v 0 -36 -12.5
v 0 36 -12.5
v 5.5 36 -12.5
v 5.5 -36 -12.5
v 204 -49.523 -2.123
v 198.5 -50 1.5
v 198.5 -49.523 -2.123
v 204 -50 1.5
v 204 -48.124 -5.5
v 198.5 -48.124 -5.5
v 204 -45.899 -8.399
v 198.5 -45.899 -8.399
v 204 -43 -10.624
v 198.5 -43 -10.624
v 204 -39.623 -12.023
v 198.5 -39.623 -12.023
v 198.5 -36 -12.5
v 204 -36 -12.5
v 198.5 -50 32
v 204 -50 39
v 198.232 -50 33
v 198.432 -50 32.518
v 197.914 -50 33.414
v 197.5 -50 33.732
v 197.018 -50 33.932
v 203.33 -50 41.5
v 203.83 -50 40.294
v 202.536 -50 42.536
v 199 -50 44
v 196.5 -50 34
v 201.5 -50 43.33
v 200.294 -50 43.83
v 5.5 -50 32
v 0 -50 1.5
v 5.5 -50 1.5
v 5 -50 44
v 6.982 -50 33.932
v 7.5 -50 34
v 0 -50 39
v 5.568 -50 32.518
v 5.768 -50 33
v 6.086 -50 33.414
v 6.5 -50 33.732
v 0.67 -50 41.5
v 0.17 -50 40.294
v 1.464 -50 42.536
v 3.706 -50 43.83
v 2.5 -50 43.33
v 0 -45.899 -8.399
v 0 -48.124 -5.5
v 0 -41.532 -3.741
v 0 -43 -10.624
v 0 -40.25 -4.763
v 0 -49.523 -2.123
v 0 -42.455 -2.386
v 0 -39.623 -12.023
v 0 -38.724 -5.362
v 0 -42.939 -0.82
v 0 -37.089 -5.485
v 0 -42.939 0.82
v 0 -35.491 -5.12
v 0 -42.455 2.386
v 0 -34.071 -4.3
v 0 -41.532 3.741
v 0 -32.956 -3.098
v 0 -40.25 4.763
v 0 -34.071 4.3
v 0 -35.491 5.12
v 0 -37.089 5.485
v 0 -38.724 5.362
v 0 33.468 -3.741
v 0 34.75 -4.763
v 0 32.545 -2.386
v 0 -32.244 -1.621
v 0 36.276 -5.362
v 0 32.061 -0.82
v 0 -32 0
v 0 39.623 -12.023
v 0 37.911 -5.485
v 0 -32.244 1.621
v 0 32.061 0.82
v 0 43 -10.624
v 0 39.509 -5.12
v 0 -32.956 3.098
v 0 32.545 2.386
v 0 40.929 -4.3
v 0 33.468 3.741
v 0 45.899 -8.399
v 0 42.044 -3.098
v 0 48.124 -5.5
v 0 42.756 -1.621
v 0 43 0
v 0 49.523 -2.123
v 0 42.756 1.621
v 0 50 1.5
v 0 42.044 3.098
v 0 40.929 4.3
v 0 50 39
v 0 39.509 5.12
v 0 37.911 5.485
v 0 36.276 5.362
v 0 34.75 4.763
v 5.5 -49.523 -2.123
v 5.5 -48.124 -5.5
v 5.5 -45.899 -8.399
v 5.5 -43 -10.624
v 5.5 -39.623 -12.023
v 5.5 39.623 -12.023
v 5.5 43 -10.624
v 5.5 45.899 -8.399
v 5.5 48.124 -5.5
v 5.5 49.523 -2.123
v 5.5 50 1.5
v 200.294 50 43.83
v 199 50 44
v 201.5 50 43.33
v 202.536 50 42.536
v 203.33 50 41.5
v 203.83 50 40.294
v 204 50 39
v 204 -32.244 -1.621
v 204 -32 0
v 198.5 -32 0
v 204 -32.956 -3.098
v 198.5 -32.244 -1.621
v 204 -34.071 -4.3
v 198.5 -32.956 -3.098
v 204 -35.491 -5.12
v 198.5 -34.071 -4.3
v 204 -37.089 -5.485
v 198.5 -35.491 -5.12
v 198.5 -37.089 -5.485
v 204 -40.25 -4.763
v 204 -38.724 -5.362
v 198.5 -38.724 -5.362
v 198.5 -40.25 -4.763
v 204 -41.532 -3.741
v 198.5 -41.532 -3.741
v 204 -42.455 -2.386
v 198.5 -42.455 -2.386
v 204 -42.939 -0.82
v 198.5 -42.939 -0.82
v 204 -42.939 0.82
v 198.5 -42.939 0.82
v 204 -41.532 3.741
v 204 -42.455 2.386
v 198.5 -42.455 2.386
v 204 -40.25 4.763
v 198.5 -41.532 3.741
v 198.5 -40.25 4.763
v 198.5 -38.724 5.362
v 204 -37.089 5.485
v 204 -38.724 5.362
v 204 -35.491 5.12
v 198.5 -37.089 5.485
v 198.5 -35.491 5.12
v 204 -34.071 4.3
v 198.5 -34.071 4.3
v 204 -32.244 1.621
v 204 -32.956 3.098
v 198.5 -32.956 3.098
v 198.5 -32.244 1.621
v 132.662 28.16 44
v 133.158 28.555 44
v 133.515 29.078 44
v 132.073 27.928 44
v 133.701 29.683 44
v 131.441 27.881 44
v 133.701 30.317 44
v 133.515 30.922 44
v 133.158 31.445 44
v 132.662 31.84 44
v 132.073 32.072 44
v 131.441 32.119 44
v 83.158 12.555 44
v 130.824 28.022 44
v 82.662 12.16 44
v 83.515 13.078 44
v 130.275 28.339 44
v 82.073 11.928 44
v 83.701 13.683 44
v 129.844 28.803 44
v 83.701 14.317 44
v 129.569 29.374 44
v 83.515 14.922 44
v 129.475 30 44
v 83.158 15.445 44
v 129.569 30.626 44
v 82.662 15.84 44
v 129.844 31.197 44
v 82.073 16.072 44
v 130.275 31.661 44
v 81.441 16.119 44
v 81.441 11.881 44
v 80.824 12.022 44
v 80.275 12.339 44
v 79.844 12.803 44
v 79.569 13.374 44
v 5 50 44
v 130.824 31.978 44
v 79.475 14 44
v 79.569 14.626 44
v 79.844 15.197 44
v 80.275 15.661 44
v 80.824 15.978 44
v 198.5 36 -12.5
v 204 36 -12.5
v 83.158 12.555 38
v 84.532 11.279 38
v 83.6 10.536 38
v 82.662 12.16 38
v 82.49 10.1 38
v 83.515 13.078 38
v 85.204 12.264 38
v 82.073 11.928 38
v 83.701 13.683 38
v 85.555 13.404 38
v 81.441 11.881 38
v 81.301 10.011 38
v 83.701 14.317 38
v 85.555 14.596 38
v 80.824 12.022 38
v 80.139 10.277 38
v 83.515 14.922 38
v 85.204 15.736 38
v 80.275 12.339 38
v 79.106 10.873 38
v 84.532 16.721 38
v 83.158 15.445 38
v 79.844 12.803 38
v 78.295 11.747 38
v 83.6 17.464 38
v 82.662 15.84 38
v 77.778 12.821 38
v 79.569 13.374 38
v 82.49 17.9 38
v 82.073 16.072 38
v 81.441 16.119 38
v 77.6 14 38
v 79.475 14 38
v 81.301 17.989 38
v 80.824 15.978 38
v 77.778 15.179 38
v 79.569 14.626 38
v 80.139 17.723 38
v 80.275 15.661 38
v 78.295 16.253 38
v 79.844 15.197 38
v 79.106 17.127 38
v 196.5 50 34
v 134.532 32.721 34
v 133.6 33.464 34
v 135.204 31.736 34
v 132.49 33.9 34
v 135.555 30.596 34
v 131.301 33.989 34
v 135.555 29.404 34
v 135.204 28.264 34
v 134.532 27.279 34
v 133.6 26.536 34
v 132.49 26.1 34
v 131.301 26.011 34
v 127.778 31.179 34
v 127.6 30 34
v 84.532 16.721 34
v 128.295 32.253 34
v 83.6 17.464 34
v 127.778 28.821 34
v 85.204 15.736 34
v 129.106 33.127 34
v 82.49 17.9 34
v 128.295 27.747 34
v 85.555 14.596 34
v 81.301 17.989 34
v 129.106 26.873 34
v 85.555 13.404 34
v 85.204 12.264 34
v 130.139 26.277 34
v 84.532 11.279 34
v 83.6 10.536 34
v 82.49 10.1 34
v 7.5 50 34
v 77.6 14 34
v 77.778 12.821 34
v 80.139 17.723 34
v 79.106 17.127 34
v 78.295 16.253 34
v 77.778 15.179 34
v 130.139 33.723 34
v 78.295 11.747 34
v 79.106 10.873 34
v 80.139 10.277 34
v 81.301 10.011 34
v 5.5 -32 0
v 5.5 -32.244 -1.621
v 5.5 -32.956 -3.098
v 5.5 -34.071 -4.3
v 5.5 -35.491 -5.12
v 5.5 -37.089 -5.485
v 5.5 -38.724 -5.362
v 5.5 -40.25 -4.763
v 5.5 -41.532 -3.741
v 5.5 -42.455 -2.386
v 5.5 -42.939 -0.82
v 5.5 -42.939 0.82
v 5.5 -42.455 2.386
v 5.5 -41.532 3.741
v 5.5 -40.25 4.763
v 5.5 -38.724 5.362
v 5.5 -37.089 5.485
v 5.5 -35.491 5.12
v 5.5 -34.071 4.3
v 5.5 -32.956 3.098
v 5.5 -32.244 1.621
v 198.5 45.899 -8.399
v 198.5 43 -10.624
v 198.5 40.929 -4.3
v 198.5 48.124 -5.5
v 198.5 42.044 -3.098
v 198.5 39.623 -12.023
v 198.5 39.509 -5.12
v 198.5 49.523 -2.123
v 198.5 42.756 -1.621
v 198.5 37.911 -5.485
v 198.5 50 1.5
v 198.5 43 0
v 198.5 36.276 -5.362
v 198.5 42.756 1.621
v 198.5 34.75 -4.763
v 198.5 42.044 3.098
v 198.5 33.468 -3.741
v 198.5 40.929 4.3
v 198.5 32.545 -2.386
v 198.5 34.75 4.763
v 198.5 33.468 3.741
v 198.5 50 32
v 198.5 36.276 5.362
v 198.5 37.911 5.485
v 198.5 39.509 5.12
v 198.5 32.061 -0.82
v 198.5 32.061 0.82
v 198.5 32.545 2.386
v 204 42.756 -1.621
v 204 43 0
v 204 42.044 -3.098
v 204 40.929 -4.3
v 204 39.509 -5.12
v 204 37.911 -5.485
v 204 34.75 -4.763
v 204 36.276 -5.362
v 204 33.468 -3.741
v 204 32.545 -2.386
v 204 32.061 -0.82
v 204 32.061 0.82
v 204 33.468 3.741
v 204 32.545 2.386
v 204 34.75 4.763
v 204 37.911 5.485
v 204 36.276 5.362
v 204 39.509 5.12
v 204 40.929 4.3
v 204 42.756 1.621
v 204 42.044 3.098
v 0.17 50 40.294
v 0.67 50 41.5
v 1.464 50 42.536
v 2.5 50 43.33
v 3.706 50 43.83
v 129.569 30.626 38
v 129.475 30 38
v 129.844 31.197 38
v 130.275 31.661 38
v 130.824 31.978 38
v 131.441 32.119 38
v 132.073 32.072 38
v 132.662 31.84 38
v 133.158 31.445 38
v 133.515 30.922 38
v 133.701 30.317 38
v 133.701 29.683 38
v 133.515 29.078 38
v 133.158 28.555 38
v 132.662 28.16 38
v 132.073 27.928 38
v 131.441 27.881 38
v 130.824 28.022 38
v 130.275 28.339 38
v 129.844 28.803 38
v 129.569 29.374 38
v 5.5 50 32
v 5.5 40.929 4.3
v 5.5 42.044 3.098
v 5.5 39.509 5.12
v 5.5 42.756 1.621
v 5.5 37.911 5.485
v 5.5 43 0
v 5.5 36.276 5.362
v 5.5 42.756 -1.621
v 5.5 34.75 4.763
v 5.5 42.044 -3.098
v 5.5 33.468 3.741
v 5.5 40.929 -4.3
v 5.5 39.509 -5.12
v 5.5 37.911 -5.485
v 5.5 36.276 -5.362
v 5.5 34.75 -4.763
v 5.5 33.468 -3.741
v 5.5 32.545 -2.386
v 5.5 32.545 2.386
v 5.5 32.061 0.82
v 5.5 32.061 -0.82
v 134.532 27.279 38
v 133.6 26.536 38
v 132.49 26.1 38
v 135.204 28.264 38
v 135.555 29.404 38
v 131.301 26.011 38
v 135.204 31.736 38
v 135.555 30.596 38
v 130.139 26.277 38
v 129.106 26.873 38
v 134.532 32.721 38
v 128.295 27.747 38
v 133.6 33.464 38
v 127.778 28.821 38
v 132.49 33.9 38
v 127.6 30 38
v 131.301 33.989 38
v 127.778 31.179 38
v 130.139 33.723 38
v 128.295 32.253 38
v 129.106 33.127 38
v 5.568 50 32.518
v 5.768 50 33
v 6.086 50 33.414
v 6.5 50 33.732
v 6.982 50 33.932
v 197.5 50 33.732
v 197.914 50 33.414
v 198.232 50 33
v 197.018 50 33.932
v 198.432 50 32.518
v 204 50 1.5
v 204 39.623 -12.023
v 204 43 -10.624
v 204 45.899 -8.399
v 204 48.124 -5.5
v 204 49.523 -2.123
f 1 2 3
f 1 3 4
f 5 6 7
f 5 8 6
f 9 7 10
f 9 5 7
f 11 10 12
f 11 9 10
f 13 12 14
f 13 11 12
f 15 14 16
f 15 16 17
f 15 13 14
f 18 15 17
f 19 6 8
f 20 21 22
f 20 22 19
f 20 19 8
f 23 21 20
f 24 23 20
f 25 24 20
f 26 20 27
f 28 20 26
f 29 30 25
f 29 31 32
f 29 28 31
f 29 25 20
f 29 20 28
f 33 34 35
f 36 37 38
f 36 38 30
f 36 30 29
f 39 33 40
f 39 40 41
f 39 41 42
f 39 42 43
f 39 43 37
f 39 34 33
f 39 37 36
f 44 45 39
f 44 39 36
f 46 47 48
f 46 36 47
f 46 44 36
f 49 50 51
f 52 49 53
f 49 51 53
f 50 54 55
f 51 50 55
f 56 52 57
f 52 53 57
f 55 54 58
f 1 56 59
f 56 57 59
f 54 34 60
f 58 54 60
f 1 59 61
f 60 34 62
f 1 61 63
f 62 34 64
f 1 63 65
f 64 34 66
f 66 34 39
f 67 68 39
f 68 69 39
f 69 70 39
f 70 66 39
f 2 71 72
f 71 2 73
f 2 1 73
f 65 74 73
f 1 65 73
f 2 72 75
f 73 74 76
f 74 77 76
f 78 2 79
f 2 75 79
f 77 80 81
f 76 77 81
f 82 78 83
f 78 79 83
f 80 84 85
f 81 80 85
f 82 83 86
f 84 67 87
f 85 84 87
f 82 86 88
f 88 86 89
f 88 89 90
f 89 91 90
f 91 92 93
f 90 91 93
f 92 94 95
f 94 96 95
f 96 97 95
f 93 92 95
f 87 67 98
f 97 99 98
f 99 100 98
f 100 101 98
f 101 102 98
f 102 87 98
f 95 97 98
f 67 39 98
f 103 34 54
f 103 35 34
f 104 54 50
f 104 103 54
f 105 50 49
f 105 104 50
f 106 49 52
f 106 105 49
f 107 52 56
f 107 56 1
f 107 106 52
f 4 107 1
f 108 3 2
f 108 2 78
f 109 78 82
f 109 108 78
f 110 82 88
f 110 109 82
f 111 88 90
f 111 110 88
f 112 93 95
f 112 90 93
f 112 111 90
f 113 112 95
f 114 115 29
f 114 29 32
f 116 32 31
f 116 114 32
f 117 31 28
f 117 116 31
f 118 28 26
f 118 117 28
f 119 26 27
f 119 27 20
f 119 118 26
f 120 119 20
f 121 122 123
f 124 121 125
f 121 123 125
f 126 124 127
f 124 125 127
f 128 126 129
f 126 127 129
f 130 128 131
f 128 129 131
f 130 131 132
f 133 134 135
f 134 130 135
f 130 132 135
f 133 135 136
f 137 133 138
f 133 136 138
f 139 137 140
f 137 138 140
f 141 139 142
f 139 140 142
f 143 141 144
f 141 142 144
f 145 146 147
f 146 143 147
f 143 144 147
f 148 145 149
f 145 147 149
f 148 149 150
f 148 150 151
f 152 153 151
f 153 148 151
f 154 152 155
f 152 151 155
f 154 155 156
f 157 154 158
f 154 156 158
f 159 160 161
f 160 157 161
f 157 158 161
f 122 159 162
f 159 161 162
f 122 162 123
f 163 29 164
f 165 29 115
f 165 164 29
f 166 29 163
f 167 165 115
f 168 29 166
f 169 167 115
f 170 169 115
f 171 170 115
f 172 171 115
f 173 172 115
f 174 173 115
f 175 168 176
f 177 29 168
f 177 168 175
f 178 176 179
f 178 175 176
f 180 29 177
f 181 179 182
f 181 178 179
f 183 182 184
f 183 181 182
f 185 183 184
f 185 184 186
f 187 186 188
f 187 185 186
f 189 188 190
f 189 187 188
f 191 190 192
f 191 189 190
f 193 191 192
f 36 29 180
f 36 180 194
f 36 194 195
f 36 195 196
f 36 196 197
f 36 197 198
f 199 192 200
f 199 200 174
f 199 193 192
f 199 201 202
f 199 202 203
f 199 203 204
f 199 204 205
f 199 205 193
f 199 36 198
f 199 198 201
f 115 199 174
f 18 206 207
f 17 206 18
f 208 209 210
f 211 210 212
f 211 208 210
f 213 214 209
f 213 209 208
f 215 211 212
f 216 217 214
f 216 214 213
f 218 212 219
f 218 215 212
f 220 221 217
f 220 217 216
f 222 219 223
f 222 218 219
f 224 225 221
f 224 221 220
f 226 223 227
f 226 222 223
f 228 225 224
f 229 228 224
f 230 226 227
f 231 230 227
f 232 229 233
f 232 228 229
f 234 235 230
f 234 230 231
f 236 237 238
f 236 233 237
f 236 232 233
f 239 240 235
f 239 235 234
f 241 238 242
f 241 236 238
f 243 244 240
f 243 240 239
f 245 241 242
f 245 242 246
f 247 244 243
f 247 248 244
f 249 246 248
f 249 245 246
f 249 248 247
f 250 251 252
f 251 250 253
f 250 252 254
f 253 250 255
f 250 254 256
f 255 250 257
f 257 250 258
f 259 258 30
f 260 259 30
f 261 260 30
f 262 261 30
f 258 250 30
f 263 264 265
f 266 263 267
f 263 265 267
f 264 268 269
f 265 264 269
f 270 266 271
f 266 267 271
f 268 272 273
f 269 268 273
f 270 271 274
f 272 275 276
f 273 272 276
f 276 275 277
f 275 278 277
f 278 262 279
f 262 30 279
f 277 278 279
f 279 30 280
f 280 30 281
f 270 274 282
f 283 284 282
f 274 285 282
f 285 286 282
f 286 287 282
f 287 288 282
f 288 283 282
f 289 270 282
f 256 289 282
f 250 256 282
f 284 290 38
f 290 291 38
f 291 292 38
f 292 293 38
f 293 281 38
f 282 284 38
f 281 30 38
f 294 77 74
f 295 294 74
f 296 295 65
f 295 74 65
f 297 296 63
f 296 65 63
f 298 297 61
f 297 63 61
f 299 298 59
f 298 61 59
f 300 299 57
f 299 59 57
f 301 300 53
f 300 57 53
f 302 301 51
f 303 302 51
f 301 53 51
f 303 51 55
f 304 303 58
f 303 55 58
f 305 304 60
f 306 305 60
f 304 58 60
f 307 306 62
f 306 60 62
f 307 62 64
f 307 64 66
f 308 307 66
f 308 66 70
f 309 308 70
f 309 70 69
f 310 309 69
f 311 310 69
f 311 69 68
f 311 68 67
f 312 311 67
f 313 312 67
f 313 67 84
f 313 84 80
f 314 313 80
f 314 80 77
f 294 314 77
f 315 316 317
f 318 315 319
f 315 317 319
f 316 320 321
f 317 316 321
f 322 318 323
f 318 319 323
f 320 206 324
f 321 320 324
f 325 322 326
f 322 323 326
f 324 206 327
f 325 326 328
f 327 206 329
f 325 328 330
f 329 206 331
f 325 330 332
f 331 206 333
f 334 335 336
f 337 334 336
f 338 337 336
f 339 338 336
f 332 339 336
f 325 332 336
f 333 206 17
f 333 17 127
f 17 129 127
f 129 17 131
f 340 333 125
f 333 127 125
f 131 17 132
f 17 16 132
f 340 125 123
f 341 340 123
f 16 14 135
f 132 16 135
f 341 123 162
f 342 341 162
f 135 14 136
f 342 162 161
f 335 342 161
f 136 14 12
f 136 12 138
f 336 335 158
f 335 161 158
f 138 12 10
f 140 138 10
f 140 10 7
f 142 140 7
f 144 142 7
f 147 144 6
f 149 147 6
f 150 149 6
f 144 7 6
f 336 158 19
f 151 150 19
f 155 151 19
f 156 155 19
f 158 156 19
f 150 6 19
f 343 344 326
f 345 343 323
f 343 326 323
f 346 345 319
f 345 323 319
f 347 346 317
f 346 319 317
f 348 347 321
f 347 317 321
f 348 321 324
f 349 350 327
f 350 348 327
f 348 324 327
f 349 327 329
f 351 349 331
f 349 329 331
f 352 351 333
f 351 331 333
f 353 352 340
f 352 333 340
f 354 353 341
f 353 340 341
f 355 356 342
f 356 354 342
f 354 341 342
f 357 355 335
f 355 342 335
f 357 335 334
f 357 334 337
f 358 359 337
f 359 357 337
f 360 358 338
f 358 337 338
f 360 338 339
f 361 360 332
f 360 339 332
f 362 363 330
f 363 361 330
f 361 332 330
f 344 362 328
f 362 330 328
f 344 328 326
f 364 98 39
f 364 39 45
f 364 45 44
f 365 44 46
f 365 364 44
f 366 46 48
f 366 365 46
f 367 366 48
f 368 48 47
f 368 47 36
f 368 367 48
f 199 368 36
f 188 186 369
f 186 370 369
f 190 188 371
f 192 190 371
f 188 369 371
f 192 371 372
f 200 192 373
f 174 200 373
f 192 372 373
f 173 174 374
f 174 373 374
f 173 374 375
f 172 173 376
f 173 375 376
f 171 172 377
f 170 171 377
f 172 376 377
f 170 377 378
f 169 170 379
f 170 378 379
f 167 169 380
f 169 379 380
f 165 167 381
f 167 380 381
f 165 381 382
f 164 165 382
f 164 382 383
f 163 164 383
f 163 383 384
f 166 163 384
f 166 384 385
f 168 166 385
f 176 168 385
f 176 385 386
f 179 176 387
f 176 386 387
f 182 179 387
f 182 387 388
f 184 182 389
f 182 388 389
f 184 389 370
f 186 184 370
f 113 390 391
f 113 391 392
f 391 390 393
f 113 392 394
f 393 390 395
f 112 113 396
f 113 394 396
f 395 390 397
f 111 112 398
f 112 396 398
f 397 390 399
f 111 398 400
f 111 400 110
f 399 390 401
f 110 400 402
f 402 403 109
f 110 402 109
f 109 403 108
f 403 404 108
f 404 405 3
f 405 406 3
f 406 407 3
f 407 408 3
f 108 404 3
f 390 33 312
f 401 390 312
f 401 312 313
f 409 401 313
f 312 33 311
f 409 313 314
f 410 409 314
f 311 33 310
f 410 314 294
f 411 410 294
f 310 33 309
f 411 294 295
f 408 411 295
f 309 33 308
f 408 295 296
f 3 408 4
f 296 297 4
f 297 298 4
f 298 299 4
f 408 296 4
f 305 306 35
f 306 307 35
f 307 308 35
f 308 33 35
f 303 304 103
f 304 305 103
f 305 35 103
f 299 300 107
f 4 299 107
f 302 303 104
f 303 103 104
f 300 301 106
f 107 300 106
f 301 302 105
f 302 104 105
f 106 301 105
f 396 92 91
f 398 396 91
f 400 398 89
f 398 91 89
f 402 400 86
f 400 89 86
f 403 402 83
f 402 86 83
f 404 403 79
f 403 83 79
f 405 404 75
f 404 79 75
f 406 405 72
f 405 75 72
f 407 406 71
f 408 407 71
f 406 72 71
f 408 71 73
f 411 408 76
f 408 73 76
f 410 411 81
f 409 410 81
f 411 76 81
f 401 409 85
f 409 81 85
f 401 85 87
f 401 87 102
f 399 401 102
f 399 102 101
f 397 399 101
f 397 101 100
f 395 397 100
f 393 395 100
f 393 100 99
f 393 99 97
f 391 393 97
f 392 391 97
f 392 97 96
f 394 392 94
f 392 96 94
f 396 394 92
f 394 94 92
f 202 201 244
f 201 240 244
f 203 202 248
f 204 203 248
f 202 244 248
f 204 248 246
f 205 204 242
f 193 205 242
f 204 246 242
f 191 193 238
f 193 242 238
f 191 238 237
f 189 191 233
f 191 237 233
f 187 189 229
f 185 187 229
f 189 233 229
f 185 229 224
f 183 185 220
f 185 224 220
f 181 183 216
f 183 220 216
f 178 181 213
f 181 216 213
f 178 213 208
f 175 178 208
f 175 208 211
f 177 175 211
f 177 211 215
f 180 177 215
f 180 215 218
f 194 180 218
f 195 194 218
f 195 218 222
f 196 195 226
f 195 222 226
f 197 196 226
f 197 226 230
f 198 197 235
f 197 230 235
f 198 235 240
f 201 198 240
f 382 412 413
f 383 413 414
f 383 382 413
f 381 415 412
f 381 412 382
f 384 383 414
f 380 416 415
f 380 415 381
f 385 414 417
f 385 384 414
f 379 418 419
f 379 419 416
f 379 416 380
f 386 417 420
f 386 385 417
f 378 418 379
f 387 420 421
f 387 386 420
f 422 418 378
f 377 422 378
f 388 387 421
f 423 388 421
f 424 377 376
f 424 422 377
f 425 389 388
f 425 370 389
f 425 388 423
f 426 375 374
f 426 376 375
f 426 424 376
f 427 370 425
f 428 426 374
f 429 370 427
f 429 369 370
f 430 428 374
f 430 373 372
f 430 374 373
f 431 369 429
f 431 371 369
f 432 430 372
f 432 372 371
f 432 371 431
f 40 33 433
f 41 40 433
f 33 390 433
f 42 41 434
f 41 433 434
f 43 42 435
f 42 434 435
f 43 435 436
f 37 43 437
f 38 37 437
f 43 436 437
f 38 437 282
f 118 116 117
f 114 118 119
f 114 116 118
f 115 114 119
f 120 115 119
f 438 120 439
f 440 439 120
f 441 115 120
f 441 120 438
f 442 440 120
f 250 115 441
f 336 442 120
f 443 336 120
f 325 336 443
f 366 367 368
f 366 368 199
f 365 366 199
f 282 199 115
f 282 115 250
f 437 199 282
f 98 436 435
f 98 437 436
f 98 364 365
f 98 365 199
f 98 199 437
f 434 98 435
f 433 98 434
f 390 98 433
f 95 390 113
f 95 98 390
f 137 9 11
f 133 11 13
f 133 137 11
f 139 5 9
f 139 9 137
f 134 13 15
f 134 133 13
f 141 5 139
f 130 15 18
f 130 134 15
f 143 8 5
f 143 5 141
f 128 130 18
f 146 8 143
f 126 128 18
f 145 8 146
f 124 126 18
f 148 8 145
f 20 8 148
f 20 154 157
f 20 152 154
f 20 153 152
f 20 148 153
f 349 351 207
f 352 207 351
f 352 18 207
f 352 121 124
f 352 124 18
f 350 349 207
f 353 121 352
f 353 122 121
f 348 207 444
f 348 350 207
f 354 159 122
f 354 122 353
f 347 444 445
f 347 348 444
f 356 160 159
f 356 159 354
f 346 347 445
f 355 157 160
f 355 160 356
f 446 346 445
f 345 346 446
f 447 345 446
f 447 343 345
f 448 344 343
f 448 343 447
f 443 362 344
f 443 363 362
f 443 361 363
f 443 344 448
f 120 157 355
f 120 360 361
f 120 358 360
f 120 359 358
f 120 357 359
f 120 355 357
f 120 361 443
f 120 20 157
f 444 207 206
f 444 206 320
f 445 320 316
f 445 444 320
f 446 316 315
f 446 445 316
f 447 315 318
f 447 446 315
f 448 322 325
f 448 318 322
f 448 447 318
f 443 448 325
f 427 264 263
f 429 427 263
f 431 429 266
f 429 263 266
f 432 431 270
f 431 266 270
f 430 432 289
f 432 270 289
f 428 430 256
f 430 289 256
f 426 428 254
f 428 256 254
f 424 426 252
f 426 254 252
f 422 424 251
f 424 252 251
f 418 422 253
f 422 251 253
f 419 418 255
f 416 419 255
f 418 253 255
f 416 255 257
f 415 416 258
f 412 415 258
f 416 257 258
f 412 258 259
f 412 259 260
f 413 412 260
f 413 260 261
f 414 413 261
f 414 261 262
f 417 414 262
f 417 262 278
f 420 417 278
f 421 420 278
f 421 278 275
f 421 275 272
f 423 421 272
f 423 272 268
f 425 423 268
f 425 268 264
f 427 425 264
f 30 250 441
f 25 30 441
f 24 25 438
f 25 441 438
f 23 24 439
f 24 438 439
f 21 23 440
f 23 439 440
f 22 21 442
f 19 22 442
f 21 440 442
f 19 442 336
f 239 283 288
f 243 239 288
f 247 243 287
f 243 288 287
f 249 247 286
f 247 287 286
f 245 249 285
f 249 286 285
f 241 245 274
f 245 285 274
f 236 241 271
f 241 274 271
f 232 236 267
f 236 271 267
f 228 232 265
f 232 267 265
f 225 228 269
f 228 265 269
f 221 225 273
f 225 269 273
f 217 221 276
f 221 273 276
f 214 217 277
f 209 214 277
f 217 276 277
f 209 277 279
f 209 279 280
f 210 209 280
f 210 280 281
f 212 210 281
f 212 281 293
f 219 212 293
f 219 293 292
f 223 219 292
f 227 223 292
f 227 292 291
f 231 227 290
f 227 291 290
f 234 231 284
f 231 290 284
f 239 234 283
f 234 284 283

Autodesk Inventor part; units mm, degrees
ref_plane "YZ Plane" through (0, 0, 0) normal (1, 0, 0) x (0, 1, 0)
ref_plane "XZ Plane" through (0, 0, 0) normal (0, 1, 0) x (-1, 0, 0)
ref_plane "XY Plane" through (0, 0, 0) normal (0, 0, 1) x (1, 0, 0)
sketch "Sketch1" plane through (0, 0, 0) normal (1, 0, 0) x (0, 1, 0)
  circle A0 centre (-37.5, 0) radius 5.5
  circle A1 centre (37.5, 0) radius 5.5
  line L0 (-50, 44) -> (50, 44)
  line L1 (50, 44) -> (50, -12.5)
  line L2 (50, -12.5) -> (-50, -12.5)
  line L3 (-50, -12.5) -> (-50, 44)
  point P0 (0, 0)
  dimension "d0" = 11
  dimension "d1" = 11
  dimension "d2" = 100
  dimension "d3" = 56.5
extrude "Extrusion1" add sketch "Sketch1" along normal blind 204
sketch "Sketch2" plane through (0, -50, -12.5) normal (0, -1, 0) x (1, 0, 0)
  line L0 (204, 0) -> (204, 56.5) projected
  line L1 (0, 0) -> (204, 0)
  line L2 (204, 0) -> (204, 56.5)
  line L3 (204, 56.5) -> (0, 56.5)
  line L4 (0, 56.5) -> (0, 0)
  line L5 (5.5, 0) -> (198.5, 0)
  line L6 (198.5, 0) -> (198.5, 46.5)
  line L7 (198.5, 46.5) -> (5.5, 46.5)
  line L8 (5.5, 46.5) -> (5.5, 0)
  point P0 (0, 12.5)
  point P1 (198.5, 0)
  dimension "d6" = 204
  dimension "d7" = 193
  dimension "d8" = 46.5
  dimension "d9" = 5.5
extrude "Extrusion2" cut sketch "Sketch2" against normal up to surface (100 mm away) contours L1 L8 L7 L6
sketch "Sketch3" plane through (204, 0, 0) normal (1, 0, 0) x (0, 0, -1)
  point P0 (0, 0)
fillet "Fillet1" radius 14 4 edges at (201.25, 50, -12.5) (201.25, -50, -12.5) (2.75, 50, -12.5) (2.75, -50, -12.5)
fillet "Fillet2" radius 2 2 edges at (198.5, 0, 34) (5.5, 0, 34)
fillet "Fillet3" radius 5 2 edges at (204, 0, 44) (0, 0, 44)
sketch "Sketch4" plane through (196.5, -50, 34) normal (0, 0, -1) x (-1, 0, 0)
  line L0 (0, 100) -> (189, 100) projected
  line L1 (58.5, 100) -> (118.5, 100)
  line L2 (118.5, 100) -> (118.5, 58)
  line L3 (118.5, 58) -> (58.5, 58)
  line L4 (58.5, 58) -> (58.5, 100)
  circle A0 centre (64.9, 80) radius 4
  circle A1 centre (114.9, 64) radius 4
  line L5 (-7.5, 14) -> (-7.5, 86) projected
  line L6 (94.5, 58) -> (94.5, 100)
  line L7 (196.5, 14) -> (196.5, 86) projected
  point P0 (196.5, 50)
  dimension "d15" = 60
  dimension "d16" = 42
  dimension "d17" = 8
  dimension "d19" = 6.4
  dimension "d20" = 8
  dimension "d22" = 6
  dimension "d24" = 36
  dimension "d25" = 102
  dimension "d26" = 204
  dimension "d34" = 16
  dimension "d36" = 50
extrude "Extrusion3" cut sketch "Sketch4" against normal blind 4 contours A1 L2 | L2 A1 | A0
sketch "Sketch5" plane through (131.6, 30, 38) normal (0, 0, -1) x (-1, 0, 0)
  circle A0 centre (0, 0) radius 4 projected
  circle A1 centre (50, -16) radius 4 projected
  circle A2 centre (0, 0) radius 2.125
  circle A3 centre (50, -16) radius 2.125
  point P0 (131.6, -30)
  dimension "d29" = 4.25
  dimension "d30" = 4.25
extrude "Extrusion4" cut sketch "Sketch5" against normal blind 6 contours A2 | A3
equation "\"d9\" = -0.5 * d7 + 0.5 * d6"
equation "\"d25\" = 0.5 * d26"
properties part number "LaserBeslag" material "PET Plastic"
